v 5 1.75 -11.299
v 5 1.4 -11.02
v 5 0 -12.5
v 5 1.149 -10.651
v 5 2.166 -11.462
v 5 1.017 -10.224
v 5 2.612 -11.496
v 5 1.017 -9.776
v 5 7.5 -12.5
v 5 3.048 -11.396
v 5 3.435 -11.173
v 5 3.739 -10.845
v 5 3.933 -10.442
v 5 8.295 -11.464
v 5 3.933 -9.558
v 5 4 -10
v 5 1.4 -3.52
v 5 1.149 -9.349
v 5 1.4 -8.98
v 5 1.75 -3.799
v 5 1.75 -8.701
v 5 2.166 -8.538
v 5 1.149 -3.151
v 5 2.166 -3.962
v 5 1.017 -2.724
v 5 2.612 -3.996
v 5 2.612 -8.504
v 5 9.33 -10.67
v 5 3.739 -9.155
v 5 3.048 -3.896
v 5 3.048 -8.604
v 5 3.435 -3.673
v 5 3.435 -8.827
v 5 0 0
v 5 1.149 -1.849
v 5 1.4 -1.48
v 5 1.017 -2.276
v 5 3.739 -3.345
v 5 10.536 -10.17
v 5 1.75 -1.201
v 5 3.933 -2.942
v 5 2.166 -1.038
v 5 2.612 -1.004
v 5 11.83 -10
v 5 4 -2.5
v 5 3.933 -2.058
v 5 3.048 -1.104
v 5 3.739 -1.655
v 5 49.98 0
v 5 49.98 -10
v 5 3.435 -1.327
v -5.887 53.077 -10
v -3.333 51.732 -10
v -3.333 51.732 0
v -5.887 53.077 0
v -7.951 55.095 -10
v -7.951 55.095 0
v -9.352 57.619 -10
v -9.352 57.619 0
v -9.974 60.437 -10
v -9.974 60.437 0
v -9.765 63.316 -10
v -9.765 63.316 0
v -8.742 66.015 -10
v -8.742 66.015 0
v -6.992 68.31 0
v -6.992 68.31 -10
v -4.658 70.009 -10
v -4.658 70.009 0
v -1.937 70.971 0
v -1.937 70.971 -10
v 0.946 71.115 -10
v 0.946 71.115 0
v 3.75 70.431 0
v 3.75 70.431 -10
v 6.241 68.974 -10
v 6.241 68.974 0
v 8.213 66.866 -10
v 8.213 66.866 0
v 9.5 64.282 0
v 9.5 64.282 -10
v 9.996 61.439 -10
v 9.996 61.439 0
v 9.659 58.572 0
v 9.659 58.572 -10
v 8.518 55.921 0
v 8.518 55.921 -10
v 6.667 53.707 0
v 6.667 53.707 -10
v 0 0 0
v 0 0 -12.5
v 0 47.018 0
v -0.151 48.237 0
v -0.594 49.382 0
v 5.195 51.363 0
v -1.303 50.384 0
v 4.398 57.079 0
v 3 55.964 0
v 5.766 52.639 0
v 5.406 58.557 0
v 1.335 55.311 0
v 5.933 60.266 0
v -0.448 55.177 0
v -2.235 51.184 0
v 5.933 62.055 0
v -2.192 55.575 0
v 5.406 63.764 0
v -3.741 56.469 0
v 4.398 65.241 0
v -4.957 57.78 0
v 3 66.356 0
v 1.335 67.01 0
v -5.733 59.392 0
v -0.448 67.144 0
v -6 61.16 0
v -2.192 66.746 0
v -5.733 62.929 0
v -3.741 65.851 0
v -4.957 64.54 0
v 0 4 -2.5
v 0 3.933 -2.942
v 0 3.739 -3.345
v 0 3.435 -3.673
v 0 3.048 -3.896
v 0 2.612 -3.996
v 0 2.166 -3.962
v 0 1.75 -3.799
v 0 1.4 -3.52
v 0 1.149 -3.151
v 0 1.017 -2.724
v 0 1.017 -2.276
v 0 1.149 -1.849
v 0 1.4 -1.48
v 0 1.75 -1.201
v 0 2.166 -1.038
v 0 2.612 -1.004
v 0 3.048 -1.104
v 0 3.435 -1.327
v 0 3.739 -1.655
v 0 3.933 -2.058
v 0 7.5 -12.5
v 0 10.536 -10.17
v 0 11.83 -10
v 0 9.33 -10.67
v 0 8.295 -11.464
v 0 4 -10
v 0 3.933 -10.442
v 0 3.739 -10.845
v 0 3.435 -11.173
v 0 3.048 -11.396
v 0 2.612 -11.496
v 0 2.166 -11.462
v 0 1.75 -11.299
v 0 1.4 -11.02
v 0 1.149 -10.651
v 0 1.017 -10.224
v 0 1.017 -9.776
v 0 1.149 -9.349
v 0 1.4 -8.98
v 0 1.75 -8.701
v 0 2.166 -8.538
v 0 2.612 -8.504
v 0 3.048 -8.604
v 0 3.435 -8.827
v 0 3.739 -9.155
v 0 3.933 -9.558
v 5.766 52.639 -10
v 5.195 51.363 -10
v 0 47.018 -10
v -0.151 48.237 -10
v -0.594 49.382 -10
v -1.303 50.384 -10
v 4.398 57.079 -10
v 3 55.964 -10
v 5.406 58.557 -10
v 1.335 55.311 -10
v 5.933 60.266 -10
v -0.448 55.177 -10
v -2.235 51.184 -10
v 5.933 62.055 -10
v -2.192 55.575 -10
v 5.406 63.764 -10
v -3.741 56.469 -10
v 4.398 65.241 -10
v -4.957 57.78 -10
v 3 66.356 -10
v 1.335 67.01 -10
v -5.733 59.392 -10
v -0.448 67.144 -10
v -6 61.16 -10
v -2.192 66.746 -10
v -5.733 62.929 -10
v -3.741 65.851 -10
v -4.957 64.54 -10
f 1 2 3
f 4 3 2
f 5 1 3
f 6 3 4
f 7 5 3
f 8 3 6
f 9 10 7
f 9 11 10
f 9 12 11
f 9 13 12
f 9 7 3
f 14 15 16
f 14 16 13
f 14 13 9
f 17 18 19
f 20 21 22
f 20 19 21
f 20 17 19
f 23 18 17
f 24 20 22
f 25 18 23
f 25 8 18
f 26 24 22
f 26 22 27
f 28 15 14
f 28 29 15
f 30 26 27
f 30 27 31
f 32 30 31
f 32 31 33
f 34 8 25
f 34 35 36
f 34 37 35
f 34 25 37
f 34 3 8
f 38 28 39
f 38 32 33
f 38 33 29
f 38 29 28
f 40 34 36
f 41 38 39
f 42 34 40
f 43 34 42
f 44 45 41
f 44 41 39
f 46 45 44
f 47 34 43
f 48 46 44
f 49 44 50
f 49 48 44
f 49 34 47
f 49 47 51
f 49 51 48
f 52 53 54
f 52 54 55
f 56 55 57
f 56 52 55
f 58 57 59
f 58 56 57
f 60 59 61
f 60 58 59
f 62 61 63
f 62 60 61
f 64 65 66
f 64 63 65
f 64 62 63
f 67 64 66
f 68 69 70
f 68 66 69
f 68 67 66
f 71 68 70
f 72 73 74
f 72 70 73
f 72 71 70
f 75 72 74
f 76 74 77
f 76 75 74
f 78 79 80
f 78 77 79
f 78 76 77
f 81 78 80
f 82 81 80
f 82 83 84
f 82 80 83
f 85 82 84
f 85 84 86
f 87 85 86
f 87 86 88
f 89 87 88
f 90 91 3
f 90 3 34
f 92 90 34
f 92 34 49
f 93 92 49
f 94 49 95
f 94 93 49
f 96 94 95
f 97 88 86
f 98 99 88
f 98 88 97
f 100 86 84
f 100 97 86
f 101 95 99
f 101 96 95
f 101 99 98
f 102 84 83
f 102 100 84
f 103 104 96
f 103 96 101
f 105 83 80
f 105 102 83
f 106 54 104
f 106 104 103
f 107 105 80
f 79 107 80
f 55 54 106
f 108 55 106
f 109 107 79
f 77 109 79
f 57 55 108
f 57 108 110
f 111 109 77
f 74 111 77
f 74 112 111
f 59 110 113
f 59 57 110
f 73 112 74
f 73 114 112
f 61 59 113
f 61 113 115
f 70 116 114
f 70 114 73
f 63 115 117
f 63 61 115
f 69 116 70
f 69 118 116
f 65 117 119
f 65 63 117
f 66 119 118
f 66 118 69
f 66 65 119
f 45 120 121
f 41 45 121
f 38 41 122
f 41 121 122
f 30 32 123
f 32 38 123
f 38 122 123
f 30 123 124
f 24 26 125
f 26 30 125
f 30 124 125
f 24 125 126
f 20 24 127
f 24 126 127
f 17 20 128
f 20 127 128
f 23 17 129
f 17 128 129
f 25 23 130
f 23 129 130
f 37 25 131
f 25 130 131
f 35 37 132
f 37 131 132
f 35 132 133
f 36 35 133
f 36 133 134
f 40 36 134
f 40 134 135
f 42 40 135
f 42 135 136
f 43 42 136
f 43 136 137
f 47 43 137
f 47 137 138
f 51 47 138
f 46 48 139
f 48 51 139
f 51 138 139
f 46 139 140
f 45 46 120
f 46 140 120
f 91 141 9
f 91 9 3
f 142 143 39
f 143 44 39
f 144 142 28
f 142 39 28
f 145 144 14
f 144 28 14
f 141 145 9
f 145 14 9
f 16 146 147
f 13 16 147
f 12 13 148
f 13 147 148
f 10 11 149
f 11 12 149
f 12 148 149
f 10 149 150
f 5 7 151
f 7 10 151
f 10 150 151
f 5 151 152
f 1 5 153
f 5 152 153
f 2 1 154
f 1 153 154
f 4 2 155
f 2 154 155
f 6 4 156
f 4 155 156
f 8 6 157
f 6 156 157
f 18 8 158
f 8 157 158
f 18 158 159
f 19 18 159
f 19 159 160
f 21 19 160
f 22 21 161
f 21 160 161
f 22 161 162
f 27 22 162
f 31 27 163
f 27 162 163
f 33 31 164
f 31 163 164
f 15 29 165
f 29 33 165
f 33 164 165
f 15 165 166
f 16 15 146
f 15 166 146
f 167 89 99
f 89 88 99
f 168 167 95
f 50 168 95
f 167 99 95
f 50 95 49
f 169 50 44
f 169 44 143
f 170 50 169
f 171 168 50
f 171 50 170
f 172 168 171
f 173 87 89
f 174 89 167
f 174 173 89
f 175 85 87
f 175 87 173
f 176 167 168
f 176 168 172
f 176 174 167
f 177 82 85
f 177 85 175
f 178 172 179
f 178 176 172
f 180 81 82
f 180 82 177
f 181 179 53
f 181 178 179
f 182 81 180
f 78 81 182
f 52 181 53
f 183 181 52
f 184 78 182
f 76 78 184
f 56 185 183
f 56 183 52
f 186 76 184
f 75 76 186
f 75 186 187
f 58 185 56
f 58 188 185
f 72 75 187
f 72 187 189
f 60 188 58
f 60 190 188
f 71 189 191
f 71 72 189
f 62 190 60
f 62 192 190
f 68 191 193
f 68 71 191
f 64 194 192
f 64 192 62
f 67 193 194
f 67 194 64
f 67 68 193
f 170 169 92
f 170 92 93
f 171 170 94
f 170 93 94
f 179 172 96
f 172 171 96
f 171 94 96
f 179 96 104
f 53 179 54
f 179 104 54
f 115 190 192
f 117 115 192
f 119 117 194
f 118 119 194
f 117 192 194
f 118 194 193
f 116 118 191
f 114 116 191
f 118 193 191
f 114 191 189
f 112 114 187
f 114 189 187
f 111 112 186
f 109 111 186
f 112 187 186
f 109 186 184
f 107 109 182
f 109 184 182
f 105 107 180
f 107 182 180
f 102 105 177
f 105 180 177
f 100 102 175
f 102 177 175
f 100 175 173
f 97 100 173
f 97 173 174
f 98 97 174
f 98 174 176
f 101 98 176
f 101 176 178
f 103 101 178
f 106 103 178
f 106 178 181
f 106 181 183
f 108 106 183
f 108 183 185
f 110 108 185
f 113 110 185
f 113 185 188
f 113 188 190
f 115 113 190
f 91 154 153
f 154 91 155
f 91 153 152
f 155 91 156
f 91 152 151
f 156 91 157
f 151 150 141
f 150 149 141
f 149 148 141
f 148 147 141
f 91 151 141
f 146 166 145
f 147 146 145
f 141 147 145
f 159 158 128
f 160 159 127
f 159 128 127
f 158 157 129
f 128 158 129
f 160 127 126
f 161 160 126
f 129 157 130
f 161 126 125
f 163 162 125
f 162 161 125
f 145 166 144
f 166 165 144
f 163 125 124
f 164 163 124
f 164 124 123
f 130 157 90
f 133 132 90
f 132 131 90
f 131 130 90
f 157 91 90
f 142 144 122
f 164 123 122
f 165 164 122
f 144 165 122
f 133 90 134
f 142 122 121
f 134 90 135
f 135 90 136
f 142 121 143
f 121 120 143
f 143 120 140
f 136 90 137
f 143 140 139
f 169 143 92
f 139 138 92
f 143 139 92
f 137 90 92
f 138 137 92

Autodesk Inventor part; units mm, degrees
ref_plane "YZ Plane" through (0, 0, 0) normal (1, 0, 0) x (0, 1, 0)
ref_plane "XZ Plane" through (0, 0, 0) normal (0, 1, 0) x (-1, 0, 0)
ref_plane "XY Plane" through (0, 0, 0) normal (0, 0, 1) x (1, 0, 0)
sketch "Sketch1" plane through (0, 0, 0) normal (1, 0, 0) x (0, 1, 0)
  line L0 (0, 0) -> (7.5, 0)
  line L1 (7.5, 0) -> (7.5, -12.5)
  line L2 (7.5, -12.5) -> (0, -12.5)
  line L3 (0, -12.5) -> (0, 0)
  circle A0 centre (2.5, -2.5) radius 1.5
  circle A1 centre (2.5, -10) radius 1.5
  line L4 (2.5, -2.5) -> (2.5, -10) construction
  line L5 (7.5, -12.5) -> (7.5, 0)
  point P0 (2.5, -6.25)
  point P1 (7.5, -6.25)
  point P2 (3.75, -12.5)
  dimension "d0" = 12.5
  dimension "d1" = 7.5
  dimension "d2" = 3
  dimension "d3" = 7.5
  dimension "d4" = 5
extrude "Extrusion1" add sketch "Sketch1" along normal blind 5
sketch "Sketch2" plane through (5, 0, 0) normal (1, 0, 0) x (0, 0, -1)
  line L0 (12.5, 7.5) -> (0, 7.5) projected
  line L1 (0, 7.5) -> (0, 0) projected
  line L2 (0, 7.5) -> (0, 52.5)
  line L3 (0, 52.5) -> (10, 52.5)
  line L4 (10, 52.5) -> (10, 7.5)
  dimension "d7" = 10
  dimension "d8" = 45
extrude "Extrusion2" add sketch "Sketch2" against normal blind 5
sketch "Sketch3" plane through (5, 7.5, -10) normal (0, 0, -1) x (-1, 0, 0)
  circle A0 centre (5, 53.6603) radius 10
  circle A1 centre (5, 53.6603) radius 6
  line L0 (0, 45) -> (5, 45) projected
  point P0 (5, -7.5)
  point P1 (2.5, 45)
  dimension "d11" = 12
  dimension "d12" = 4
extrude "Extrusion3" add sketch "Sketch3" against normal up to surface (10 mm away)
fillet "Fillet1" radius 5 3 edges at (5, 52.5, -5) (0, 51.1603, -5) (2.5, 7.5, -10)
properties part number "LJ12_Adapter"
